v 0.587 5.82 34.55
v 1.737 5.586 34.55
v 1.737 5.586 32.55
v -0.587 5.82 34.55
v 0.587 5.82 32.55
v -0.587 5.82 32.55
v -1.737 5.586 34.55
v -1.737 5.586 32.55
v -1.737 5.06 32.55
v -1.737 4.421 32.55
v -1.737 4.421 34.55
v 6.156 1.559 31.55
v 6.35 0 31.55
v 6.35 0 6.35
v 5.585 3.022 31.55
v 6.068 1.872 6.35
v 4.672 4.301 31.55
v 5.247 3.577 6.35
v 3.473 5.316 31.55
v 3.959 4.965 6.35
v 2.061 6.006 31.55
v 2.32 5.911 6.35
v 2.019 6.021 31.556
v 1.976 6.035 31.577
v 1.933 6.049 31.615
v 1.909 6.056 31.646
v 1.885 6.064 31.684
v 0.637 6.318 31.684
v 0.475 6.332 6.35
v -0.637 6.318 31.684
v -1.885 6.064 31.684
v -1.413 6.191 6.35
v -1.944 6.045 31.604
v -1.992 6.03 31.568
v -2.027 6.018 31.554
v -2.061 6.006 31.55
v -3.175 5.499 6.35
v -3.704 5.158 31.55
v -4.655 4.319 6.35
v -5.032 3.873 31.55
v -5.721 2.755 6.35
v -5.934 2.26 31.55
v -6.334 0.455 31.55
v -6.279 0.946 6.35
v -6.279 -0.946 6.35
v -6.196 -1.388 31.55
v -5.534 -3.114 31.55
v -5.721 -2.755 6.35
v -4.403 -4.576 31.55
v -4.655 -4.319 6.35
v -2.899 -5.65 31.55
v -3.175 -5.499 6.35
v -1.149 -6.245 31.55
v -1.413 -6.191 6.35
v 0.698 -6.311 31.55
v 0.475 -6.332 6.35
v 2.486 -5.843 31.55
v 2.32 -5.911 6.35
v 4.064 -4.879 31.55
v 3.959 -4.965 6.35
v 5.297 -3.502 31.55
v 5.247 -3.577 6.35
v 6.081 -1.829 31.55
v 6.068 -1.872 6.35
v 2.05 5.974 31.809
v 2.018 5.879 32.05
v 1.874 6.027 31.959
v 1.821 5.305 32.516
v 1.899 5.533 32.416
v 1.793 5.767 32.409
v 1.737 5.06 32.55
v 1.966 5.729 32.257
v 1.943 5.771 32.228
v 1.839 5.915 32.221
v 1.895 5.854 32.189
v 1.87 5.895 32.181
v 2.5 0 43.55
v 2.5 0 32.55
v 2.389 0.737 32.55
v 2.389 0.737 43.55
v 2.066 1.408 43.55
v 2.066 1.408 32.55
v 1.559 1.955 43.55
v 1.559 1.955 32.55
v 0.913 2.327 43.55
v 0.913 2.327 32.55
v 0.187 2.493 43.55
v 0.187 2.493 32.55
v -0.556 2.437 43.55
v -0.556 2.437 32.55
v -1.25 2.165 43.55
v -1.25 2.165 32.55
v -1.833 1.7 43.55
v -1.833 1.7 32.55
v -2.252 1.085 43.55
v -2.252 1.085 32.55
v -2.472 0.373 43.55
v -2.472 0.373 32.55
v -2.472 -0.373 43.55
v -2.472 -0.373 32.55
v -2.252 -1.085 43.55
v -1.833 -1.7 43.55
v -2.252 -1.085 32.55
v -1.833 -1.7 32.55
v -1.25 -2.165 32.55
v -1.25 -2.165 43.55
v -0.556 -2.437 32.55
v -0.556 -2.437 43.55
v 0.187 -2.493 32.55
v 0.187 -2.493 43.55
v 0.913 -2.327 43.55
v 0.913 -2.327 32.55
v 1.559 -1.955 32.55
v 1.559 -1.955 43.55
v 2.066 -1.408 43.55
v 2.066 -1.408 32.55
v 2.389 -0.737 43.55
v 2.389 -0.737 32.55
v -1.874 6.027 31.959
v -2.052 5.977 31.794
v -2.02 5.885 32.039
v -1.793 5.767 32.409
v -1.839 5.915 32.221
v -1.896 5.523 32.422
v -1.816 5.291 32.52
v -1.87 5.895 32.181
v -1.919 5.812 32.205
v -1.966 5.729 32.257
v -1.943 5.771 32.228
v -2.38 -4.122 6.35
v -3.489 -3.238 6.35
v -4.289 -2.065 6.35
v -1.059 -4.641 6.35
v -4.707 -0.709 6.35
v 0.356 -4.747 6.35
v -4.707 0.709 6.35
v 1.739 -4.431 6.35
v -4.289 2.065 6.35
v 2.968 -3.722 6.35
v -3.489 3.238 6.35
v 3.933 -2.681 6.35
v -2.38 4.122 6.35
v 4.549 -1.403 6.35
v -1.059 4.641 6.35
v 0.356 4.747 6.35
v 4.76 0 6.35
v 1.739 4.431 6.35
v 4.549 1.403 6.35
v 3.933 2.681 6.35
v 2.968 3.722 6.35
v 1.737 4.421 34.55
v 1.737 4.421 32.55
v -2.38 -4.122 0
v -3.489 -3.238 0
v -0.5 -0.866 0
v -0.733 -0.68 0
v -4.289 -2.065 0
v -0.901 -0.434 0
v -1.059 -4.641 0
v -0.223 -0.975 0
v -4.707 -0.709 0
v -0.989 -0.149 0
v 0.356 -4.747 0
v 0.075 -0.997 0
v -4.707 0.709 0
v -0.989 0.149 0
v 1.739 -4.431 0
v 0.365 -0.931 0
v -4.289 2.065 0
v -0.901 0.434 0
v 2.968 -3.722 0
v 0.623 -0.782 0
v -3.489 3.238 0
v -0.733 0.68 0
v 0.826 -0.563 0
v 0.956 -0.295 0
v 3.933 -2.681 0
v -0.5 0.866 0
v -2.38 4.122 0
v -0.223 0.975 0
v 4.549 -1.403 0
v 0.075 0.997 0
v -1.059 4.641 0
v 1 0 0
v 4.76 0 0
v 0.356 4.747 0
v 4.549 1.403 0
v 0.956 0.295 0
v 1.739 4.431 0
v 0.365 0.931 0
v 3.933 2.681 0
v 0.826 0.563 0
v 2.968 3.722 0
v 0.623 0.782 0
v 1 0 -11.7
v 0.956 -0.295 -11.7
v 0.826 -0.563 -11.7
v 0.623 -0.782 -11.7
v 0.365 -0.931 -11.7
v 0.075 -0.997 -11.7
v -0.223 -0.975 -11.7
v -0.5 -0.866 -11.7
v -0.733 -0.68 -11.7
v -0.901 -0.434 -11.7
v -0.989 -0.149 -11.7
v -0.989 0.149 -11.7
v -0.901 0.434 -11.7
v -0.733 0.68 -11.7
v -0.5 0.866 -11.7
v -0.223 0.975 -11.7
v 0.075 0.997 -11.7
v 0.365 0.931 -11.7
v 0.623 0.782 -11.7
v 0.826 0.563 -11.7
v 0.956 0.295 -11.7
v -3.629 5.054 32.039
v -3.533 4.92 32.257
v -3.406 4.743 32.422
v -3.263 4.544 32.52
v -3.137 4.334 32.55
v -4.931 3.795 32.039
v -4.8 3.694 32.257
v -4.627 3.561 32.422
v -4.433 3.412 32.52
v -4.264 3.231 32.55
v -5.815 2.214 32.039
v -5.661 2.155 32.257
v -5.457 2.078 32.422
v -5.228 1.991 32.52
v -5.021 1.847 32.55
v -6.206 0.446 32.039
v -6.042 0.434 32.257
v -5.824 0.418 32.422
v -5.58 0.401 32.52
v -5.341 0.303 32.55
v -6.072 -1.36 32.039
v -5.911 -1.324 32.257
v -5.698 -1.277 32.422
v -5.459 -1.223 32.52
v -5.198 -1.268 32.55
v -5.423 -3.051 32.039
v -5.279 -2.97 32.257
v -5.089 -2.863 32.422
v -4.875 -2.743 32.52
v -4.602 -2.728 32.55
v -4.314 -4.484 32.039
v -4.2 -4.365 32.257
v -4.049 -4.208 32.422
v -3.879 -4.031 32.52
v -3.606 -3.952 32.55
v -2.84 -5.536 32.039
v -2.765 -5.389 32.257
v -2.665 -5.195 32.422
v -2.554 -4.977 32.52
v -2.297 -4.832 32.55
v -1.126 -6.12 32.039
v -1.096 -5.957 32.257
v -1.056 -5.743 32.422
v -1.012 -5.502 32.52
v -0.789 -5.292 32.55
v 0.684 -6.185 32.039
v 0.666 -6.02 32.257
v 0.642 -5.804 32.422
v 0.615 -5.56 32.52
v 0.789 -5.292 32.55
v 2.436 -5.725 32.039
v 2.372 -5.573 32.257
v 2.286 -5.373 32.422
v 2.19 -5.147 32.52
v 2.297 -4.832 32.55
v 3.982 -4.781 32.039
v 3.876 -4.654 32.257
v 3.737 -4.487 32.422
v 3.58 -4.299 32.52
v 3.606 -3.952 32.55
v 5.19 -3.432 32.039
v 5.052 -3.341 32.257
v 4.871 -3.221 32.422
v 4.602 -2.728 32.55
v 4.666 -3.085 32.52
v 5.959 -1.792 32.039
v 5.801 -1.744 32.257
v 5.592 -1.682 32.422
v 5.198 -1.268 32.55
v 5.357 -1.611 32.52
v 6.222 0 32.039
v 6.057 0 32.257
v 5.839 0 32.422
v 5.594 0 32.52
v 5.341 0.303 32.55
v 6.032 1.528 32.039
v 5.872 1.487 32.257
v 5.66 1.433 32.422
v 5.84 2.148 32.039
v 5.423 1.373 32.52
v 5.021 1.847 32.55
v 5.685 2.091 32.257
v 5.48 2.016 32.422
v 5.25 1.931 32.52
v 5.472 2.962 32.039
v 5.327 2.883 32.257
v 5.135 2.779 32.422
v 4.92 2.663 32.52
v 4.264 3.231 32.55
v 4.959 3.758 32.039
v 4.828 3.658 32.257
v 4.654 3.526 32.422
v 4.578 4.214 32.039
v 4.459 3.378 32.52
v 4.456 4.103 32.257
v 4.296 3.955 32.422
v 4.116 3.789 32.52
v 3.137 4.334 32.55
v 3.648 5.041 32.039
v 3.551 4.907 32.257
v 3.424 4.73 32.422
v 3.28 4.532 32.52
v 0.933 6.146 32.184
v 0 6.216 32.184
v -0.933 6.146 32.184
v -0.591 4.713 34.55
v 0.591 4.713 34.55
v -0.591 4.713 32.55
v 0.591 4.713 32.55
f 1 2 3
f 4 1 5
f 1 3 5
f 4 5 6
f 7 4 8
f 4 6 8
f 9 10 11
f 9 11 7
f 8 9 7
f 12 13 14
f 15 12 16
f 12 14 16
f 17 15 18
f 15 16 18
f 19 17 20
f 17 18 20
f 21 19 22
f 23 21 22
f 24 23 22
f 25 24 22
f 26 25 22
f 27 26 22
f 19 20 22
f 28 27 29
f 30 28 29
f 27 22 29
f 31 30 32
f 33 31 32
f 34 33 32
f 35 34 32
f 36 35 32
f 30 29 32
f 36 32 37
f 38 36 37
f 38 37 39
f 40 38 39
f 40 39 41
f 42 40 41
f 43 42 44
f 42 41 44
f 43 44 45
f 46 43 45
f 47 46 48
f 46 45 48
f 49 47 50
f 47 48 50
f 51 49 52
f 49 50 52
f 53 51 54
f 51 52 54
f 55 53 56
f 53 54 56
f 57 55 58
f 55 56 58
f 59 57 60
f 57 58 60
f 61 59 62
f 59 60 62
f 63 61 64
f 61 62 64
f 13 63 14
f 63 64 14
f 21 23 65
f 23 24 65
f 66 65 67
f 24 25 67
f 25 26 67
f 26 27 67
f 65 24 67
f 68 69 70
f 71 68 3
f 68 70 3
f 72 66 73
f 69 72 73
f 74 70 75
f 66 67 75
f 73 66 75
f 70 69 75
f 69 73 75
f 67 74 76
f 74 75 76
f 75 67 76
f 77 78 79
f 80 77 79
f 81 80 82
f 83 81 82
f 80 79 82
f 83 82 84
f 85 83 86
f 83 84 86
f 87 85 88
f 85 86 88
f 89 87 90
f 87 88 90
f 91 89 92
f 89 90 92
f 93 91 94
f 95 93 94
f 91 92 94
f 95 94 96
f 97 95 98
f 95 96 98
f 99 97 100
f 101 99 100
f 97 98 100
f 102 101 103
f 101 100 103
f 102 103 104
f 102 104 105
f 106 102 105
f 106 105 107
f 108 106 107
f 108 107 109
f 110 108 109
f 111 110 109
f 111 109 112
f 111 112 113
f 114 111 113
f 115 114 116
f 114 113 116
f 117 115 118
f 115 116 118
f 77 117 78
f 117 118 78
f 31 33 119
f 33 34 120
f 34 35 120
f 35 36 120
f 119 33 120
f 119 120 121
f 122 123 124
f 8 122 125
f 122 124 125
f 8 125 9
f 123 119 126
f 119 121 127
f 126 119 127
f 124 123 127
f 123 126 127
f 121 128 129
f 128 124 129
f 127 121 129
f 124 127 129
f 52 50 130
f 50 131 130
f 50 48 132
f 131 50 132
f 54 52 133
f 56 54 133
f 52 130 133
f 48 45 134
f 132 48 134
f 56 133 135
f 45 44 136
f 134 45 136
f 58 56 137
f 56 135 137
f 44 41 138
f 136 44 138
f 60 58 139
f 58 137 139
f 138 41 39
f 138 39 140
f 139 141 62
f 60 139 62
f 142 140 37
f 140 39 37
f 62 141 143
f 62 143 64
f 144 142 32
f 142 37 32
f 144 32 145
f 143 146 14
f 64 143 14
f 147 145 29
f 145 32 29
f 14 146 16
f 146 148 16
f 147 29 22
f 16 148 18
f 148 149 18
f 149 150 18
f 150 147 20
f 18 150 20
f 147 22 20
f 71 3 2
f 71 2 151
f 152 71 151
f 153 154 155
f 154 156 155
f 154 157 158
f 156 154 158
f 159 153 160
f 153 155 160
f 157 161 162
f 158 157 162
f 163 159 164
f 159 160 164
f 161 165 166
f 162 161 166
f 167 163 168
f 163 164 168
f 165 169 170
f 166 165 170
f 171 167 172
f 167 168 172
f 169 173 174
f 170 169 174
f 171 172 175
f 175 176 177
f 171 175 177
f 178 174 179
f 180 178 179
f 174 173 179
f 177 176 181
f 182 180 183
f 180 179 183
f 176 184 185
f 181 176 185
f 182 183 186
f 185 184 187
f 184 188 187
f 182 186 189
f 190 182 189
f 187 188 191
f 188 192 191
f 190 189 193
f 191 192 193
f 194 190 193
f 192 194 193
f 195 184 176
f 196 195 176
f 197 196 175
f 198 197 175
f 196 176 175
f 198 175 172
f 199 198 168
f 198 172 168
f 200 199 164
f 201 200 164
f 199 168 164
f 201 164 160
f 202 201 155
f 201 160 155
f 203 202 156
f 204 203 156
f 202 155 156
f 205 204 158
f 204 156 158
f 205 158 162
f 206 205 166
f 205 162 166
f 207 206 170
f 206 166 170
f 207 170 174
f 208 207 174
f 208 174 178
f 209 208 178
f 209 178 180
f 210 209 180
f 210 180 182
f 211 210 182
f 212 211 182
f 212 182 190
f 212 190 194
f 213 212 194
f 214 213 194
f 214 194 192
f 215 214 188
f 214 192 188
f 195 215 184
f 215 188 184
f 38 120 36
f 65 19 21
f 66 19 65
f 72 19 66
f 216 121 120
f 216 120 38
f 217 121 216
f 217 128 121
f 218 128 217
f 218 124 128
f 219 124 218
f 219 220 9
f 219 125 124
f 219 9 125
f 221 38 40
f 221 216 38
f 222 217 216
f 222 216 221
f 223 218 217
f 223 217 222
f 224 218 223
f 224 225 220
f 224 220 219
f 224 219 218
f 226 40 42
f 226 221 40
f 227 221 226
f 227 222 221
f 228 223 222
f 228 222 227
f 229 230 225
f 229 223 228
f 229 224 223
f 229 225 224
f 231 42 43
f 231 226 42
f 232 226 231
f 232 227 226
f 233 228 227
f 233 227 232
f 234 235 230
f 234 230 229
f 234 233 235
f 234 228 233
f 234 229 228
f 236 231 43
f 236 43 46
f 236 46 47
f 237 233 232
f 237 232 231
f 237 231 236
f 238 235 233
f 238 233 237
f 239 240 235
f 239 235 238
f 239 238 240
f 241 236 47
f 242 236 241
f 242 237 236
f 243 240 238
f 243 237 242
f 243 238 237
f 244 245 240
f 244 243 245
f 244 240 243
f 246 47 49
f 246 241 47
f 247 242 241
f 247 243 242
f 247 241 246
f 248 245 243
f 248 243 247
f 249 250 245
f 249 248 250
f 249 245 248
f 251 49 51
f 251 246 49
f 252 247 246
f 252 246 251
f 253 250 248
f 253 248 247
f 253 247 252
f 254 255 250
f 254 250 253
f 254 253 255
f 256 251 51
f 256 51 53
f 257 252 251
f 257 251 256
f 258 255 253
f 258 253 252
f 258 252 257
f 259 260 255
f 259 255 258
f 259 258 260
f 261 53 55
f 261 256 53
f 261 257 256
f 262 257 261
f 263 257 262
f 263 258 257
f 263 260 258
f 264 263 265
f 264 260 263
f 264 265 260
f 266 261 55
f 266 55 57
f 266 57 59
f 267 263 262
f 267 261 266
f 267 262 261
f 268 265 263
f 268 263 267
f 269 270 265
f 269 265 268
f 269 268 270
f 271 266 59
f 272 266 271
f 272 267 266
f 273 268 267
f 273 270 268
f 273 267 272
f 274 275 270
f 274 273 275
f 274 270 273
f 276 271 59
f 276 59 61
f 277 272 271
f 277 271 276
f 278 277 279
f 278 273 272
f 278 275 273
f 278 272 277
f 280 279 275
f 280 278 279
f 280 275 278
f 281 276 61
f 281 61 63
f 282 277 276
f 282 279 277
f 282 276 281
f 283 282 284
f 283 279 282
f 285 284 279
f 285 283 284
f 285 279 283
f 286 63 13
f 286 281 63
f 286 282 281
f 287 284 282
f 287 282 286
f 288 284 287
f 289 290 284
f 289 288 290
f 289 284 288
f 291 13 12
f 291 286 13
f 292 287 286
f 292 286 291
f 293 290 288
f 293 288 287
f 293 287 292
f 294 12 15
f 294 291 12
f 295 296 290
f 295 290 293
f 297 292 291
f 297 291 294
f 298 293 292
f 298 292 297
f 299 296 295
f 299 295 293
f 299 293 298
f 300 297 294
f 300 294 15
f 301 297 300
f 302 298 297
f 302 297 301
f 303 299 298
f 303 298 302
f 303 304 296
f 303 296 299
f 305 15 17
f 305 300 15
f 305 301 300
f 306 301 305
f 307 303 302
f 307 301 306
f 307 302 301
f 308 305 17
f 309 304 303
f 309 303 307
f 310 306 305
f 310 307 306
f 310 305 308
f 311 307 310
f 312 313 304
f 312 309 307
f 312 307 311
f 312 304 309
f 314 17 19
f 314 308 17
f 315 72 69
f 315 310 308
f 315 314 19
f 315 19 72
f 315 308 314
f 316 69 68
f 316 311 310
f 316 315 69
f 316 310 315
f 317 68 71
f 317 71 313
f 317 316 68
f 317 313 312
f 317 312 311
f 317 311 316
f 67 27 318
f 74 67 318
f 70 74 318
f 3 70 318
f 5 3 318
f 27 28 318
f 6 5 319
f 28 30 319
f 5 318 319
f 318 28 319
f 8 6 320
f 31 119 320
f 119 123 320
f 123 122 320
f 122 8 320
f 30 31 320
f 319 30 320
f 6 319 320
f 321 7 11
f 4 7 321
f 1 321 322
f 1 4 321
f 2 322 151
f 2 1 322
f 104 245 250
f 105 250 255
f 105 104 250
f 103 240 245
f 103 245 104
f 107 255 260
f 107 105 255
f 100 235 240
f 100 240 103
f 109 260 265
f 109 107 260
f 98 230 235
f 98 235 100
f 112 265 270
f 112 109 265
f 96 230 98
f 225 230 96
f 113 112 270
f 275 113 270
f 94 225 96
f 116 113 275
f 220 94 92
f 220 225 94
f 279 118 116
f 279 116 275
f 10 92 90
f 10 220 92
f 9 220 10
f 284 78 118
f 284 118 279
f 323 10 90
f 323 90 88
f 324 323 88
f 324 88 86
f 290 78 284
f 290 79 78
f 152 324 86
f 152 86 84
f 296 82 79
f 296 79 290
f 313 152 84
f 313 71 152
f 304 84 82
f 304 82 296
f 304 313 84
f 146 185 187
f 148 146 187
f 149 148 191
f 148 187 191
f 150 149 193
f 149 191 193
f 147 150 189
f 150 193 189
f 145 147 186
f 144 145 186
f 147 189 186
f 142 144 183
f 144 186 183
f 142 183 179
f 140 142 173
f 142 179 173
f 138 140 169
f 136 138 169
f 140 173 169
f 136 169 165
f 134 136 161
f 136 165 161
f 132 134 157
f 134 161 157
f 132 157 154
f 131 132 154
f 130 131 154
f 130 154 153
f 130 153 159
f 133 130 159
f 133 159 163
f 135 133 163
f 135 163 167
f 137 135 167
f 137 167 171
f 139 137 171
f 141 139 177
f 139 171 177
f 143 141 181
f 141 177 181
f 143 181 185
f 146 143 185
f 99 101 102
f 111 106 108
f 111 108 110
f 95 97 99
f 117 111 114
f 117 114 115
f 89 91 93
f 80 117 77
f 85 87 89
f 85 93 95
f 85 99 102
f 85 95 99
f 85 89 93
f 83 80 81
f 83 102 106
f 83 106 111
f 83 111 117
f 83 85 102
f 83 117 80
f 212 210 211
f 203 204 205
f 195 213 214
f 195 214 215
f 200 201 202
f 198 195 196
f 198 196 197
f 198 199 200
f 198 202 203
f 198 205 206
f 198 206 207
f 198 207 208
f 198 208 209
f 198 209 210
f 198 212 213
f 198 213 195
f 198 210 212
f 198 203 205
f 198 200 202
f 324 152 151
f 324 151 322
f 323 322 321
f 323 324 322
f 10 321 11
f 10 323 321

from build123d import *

# Parameters (mm, degrees)
SKETCH_R     = 4.76
PAD_DEPTH    = 6.35
SKETCH001_R  = 6.35
PAD001_DEPTH = 26.2
SKETCH002_R  = 1
PAD002_DEPTH = 11.7
SKETCH003_R  = 2.5
PAD003_DEPTH = 11
PAD004_DEPTH = 2
FILLET_R     = 1


with BuildPart() as part:
    # Sketch → Pad (new body)
    with BuildSketch(Plane.XY):
        Circle(SKETCH_R)
    extrude(amount=PAD_DEPTH)

    # Sketch001 (on Face3 of Pad) → Pad001 (join)
    with BuildSketch(Plane.XY.offset(6.35)):
        Circle(SKETCH001_R)
    extrude(amount=PAD001_DEPTH)

    # Sketch002 (on Face5 of Pad001) → Pad002 (join)
    with BuildSketch(Plane(origin=(0, 0, 0), x_dir=(1, 0, 0), z_dir=(0, 0, -1))):
        Circle(SKETCH002_R)
    extrude(amount=PAD002_DEPTH)

    # Sketch003 (on Face3 of Pad002) → Pad003 (join)
    with BuildSketch(Plane.XY.offset(32.55)):
        Circle(SKETCH003_R)
    extrude(amount=PAD003_DEPTH)

    # Sketch004 (on Face3 of Pad003) → Pad004 (join)
    with BuildSketch(Plane.XY.offset(32.55)):
        with BuildLine():
            ThreePointArc((1.736759, 5.586248), (0, 5.85), (-1.736759, 5.586248))
            Line((-1.736759, 4.421105), (-1.736759, 5.586248))
            ThreePointArc((1.736759, 4.421105), (0, 4.75), (-1.736759, 4.421105))
            Line((1.736759, 5.586248), (1.736759, 4.421105))
        make_face()
    extrude(amount=PAD004_DEPTH)

    # Fillet
    fillet_edges = [part.edges().sort_by_distance(p)[0] for p in [
        (-6.35, 0, 32.55),
    ]]
    fillet(fillet_edges, radius=FILLET_R)


solid = part.part
